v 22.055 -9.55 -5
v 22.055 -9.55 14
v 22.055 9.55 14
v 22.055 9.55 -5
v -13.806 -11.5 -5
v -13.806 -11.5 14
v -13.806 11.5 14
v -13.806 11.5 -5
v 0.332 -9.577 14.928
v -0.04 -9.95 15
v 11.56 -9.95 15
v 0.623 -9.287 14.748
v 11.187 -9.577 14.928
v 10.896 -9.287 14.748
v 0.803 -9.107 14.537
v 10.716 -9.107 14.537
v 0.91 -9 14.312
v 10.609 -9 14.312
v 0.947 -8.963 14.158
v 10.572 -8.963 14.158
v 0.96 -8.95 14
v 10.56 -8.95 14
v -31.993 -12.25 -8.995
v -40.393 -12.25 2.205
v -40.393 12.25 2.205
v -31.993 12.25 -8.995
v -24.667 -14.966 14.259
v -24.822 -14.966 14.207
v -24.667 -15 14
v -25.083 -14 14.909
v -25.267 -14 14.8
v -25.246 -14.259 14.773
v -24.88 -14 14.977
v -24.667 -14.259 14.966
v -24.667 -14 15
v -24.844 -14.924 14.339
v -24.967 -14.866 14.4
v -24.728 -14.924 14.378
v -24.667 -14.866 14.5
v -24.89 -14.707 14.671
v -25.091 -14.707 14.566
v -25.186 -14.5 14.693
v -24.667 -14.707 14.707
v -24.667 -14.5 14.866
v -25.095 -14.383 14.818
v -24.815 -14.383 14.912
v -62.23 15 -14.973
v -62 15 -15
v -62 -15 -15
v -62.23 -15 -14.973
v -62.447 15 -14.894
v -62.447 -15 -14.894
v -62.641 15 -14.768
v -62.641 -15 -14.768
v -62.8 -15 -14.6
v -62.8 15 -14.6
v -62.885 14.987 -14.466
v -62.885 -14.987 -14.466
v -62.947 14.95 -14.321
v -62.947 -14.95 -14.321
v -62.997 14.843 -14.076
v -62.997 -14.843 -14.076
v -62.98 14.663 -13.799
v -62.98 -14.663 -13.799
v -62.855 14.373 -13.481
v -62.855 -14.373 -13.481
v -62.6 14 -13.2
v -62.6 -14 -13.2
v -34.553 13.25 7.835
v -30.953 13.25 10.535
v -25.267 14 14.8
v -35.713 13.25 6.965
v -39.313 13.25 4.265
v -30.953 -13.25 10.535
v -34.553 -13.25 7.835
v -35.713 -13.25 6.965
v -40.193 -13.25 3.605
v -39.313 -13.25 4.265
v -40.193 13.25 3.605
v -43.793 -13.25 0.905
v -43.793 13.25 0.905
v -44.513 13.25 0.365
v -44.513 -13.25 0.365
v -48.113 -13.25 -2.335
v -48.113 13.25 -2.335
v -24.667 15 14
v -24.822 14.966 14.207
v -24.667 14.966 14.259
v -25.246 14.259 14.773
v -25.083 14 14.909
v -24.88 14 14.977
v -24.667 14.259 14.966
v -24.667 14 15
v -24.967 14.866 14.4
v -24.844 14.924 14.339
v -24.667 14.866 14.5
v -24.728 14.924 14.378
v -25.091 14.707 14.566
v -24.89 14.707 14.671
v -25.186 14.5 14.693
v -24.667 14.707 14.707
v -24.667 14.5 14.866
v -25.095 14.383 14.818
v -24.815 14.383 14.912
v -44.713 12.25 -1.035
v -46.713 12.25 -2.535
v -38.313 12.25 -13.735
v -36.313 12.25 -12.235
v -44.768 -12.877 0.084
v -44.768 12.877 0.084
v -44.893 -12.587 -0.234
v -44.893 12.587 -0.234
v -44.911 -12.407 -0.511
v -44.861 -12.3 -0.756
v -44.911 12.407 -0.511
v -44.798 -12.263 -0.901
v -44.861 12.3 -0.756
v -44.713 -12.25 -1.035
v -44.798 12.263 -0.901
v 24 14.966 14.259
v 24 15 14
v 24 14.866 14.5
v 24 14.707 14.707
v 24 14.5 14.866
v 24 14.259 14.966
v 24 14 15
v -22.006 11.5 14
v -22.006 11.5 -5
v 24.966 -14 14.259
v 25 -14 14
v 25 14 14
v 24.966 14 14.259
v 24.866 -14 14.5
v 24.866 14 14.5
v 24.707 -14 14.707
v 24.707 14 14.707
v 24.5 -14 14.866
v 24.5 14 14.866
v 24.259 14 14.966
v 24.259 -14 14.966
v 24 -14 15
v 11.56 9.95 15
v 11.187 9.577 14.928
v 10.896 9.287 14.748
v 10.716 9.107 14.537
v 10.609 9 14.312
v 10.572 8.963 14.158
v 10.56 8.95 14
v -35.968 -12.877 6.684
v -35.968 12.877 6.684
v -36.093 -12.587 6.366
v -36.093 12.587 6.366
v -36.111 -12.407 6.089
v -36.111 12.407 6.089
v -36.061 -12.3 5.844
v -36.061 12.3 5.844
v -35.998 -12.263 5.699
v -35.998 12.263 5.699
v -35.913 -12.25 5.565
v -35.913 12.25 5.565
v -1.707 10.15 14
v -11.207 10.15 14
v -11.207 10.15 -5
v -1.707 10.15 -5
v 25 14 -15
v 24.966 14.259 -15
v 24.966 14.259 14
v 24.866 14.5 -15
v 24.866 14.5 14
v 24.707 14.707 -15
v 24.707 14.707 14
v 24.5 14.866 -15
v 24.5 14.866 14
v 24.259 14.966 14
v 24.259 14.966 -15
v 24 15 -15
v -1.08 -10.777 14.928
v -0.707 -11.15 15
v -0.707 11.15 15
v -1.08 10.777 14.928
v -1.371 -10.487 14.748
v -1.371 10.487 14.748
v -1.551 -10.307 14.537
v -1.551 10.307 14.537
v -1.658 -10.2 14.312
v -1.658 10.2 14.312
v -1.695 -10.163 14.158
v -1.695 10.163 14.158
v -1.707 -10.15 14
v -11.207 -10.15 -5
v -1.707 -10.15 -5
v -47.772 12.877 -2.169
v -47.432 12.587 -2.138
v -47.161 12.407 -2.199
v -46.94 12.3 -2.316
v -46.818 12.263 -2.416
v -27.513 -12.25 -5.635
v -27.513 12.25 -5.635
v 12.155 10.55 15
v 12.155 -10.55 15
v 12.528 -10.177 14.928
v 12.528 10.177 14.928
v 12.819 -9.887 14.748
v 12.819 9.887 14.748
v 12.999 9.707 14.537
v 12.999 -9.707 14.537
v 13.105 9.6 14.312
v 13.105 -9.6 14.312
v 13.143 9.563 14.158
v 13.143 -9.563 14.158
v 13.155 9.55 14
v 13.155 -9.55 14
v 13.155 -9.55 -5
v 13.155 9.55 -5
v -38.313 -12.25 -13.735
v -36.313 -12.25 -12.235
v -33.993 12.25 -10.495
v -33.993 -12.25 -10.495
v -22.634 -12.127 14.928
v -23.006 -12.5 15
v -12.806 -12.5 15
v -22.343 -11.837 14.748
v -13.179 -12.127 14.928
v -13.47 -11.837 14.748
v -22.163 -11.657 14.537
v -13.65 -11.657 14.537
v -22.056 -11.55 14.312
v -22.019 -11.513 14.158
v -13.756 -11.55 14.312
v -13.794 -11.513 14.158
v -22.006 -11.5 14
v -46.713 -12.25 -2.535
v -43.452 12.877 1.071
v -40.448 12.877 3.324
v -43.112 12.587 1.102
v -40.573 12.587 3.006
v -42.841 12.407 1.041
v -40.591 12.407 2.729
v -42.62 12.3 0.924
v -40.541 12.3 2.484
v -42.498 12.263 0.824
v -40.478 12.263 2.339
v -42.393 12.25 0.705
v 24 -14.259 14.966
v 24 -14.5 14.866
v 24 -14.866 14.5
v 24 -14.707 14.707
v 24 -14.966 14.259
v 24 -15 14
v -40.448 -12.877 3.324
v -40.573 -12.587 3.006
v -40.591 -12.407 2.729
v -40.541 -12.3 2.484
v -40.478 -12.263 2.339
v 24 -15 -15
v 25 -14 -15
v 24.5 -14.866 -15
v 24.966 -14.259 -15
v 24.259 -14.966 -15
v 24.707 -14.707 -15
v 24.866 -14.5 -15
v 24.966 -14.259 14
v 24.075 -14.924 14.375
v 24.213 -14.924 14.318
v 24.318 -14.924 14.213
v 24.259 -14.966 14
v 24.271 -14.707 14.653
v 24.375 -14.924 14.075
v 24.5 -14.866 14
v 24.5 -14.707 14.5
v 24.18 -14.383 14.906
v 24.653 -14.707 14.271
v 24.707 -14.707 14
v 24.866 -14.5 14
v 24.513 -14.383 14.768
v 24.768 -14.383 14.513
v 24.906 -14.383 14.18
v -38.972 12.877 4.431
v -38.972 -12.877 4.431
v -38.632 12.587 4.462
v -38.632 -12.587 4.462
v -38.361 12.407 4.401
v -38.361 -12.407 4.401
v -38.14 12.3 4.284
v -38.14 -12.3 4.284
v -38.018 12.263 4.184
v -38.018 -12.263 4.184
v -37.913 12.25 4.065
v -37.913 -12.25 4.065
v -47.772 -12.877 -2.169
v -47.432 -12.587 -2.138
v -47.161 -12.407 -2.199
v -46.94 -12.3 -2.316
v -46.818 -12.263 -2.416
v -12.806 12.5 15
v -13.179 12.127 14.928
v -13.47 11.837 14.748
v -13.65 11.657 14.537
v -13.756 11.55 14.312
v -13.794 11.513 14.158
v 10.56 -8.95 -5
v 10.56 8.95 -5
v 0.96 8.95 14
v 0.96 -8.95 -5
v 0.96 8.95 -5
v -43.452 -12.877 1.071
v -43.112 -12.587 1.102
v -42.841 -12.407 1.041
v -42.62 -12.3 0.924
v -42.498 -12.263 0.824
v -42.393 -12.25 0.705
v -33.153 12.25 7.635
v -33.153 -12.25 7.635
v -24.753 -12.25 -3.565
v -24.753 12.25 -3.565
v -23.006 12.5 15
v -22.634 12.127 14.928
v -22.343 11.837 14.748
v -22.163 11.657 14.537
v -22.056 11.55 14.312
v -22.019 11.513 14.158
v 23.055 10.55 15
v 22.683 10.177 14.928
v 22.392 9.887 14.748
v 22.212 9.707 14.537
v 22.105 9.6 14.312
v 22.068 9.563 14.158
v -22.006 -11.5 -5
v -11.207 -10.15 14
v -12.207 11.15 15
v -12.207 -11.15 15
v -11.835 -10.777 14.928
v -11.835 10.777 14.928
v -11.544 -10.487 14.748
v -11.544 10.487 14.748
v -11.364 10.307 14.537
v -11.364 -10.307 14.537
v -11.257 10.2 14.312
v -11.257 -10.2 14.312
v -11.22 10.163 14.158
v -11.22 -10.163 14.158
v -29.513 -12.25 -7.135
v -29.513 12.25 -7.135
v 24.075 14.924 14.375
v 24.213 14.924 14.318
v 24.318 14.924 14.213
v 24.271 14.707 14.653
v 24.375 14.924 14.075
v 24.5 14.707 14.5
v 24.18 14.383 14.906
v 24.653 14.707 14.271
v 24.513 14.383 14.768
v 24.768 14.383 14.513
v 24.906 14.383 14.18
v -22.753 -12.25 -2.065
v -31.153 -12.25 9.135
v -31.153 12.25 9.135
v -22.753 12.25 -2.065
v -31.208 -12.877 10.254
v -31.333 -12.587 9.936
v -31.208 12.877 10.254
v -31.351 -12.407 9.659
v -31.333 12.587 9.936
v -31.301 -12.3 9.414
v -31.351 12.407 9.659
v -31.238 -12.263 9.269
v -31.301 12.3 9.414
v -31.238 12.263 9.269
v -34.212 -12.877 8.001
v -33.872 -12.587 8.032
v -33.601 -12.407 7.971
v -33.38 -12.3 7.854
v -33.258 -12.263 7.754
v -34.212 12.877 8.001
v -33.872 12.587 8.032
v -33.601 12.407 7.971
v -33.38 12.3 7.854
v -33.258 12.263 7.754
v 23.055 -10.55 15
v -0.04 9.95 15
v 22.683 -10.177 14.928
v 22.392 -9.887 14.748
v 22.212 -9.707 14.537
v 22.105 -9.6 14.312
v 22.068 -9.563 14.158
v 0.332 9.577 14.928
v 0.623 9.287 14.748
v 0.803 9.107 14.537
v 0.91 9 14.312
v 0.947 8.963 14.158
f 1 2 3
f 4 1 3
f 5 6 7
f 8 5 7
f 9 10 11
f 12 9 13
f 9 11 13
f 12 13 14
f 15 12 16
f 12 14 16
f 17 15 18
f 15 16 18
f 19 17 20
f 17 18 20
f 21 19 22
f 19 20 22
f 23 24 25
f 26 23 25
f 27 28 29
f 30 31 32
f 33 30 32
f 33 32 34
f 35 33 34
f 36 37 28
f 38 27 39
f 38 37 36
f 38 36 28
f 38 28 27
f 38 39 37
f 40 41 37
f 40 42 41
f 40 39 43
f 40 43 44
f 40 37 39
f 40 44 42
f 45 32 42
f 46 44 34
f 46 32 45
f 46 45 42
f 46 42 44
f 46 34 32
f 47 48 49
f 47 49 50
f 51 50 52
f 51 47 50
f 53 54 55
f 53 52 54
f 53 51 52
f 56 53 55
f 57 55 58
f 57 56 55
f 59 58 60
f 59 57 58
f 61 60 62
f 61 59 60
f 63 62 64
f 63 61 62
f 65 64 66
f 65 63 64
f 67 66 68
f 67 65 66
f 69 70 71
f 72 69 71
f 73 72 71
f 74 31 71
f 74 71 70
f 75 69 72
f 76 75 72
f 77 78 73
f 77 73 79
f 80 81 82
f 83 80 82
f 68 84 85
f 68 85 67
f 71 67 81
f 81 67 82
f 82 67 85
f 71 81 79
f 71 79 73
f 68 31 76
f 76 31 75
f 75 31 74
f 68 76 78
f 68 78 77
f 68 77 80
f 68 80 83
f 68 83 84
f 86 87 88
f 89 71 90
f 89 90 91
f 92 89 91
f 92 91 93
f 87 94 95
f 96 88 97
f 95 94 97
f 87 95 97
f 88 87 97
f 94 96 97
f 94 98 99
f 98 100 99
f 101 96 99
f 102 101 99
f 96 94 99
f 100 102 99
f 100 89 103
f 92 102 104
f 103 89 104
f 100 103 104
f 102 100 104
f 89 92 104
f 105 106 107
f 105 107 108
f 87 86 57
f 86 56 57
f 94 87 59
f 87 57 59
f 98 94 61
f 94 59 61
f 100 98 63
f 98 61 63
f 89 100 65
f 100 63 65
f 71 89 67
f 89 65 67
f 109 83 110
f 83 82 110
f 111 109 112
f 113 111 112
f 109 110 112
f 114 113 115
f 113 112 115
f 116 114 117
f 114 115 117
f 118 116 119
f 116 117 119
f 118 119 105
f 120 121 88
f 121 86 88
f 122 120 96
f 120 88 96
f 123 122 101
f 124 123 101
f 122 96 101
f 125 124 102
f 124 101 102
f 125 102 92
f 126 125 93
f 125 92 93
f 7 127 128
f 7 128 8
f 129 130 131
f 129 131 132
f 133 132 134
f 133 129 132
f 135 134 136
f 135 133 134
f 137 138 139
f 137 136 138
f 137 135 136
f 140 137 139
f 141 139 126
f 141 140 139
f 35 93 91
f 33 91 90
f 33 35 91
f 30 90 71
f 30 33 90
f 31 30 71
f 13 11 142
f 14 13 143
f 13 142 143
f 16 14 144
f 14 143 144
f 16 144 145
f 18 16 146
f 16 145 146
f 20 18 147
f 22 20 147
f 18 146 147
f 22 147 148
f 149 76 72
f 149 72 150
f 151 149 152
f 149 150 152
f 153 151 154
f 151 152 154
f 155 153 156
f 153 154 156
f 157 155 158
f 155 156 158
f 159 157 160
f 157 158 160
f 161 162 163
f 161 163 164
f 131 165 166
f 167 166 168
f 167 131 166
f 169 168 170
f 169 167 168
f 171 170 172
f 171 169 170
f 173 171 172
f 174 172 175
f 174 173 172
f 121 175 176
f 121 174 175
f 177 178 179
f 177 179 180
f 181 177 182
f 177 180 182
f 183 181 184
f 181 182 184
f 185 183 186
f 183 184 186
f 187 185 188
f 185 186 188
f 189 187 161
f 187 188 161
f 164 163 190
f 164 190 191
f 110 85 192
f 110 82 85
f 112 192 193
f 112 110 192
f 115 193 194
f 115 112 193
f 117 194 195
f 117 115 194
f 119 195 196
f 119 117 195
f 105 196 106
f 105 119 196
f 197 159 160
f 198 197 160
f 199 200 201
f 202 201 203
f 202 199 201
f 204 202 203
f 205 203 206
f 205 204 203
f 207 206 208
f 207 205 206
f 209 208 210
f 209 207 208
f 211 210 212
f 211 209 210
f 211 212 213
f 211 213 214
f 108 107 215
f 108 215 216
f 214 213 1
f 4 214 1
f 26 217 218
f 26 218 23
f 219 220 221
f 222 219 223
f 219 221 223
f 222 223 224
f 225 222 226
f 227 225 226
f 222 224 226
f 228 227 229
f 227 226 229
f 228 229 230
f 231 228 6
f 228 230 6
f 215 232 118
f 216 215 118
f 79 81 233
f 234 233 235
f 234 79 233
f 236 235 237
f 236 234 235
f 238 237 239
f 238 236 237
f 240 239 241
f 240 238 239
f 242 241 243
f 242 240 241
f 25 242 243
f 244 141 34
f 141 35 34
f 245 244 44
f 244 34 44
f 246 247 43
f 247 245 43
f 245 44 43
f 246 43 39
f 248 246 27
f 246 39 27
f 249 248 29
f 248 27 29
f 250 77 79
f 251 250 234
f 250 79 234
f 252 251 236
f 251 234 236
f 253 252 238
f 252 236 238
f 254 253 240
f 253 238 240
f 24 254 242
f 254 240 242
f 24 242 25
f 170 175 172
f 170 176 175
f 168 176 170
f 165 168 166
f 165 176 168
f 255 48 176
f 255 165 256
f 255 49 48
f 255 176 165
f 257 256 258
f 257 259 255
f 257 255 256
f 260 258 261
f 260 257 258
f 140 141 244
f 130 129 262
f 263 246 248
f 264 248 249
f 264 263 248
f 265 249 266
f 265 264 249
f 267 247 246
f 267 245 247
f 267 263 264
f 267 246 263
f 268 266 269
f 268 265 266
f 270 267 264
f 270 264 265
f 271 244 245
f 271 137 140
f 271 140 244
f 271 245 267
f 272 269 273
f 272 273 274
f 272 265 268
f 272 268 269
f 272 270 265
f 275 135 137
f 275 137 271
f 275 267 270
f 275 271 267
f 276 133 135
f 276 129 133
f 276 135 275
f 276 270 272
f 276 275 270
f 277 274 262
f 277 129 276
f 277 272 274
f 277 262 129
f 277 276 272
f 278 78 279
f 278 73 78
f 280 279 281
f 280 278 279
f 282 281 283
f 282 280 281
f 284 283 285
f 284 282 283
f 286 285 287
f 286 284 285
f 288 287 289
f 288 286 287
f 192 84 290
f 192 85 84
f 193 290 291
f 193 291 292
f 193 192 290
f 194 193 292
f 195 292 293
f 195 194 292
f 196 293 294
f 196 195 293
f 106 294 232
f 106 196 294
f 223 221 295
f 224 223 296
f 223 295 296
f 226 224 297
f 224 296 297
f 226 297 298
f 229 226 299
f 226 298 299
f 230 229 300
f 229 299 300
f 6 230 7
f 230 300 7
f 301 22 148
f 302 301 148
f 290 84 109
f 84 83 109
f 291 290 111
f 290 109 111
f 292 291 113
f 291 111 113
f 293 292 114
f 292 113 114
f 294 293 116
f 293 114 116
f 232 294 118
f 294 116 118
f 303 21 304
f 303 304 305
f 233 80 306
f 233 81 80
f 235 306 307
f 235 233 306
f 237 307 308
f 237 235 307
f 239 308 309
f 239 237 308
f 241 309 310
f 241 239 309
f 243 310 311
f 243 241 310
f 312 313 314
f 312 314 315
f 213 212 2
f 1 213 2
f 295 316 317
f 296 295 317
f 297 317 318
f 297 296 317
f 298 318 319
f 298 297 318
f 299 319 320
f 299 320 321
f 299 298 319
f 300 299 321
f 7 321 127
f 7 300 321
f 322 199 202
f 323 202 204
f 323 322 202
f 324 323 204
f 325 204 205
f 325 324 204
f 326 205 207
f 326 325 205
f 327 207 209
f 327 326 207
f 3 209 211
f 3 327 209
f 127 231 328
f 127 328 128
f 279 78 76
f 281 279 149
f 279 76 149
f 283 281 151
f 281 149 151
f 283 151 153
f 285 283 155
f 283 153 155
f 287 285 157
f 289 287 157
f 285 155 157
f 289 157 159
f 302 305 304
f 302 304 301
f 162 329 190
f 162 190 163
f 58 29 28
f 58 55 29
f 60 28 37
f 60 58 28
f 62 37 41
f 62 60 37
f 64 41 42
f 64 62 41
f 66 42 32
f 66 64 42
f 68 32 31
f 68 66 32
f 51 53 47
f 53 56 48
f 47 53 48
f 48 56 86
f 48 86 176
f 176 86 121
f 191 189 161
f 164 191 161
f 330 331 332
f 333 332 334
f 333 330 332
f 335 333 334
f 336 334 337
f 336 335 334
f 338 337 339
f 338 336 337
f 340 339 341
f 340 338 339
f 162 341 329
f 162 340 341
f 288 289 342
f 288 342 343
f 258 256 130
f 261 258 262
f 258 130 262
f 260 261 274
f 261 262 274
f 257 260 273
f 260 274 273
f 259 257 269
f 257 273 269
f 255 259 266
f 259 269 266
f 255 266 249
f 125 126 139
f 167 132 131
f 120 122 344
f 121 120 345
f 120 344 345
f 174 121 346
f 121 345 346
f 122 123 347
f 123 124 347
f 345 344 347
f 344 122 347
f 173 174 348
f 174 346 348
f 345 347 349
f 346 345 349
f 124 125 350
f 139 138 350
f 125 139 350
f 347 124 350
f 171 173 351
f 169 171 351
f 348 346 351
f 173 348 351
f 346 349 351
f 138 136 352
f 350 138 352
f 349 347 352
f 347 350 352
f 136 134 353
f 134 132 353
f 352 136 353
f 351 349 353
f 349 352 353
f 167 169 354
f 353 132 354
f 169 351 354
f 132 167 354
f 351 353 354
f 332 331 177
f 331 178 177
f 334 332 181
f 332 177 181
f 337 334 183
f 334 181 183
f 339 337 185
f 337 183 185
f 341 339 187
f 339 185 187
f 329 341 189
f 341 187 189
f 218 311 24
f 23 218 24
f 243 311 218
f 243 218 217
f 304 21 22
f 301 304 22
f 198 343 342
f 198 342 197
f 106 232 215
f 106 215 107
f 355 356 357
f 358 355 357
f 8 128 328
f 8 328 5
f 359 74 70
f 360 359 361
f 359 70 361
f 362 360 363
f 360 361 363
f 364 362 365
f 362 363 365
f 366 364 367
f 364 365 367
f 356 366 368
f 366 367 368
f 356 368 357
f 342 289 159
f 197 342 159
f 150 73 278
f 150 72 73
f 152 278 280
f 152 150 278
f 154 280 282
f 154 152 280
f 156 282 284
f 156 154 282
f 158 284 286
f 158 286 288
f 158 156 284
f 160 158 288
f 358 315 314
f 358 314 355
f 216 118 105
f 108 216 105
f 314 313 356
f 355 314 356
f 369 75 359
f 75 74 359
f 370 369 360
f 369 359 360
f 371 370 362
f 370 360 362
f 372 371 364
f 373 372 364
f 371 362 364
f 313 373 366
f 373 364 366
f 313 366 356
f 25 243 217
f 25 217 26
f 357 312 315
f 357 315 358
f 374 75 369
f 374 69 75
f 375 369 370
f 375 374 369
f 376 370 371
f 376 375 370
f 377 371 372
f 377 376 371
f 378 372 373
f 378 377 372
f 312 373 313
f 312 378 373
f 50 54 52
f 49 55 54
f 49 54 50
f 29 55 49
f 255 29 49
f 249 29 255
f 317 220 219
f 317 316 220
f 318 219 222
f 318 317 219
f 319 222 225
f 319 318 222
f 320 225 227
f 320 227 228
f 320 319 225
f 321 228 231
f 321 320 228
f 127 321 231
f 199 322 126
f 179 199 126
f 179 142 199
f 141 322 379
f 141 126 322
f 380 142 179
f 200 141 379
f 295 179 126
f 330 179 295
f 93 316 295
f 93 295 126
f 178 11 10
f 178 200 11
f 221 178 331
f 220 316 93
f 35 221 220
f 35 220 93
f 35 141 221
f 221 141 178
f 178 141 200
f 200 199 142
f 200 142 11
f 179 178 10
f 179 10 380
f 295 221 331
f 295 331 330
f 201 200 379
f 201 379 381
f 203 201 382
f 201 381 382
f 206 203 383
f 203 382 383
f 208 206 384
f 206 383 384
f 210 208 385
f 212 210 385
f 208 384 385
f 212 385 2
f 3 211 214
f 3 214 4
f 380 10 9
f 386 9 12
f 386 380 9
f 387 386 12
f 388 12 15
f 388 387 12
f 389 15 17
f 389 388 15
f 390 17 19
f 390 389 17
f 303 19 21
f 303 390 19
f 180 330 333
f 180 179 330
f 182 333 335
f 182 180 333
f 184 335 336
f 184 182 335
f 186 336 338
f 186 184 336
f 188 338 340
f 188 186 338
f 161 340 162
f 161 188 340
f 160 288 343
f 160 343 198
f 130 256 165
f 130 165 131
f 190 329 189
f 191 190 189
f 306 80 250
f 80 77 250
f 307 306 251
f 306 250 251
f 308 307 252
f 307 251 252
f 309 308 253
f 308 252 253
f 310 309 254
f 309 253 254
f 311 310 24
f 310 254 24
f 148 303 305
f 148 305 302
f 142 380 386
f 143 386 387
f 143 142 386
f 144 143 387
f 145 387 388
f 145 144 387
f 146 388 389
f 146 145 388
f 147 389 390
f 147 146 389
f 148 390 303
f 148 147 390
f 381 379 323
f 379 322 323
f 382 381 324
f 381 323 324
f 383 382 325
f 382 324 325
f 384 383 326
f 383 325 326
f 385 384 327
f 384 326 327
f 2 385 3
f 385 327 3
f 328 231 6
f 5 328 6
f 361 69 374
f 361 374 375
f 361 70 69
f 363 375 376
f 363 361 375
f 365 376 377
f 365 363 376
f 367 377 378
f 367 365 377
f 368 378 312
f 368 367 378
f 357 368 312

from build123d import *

# Parameters (mm, degrees)
F1_DEPTH = 15
F3_W     = 8.2
F3_H     = 23
F3_W_2   = 9.5
F3_H_2   = 20.3
F3_W_3   = 9.6
F3_H_3   = 17.9
F3_W_4   = 8.9
F3_H_4   = 19.1
F4_DEPTH = 25
F5_W     = 2.5
F5_H     = 24.5
F6_DEPTH = 15
F7_DEPTH = 15
F8_R     = 1


# Not quite as in the source:
# - a feature names something its author has since deleted; it is built from what else it names


with BuildPart() as f1:
    # F0 (on Front) → F1 (new body, symmetric)
    with BuildSketch(Plane.XZ):
        Polygon((25, -15), (25, 15), (-25, 15), (-65, -15), (-25, -15), align=None)
    extrude(amount=F1_DEPTH, both=True)

    # F3 (on offset) → F4 (cut)
    with BuildSketch(Plane.XY.offset(20)):
        with Locations((-17.9062577261, 0)):
            Rectangle(F3_W, F3_H)
        with Locations((-6.4574469417, 0)):
            Rectangle(F3_W_2, F3_H_2)
        with Locations((5.7595338684, 0)):
            Rectangle(F3_W_3, F3_H_3)
        with Locations((17.6052688631, 0)):
            Rectangle(F3_W_4, F3_H_4)
    extrude(amount=-F4_DEPTH, mode=Mode.SUBTRACT)

    # F5 (on face) → F6 (cut)
    with BuildSketch(Plane(origin=(-16.2, 0, 21.6), x_dir=(0.8, 0, 0.6), z_dir=(-0.6, 0, 0.8))):
        with Locations((-20.6918526966, 0)):
            Rectangle(F5_W, F5_H)
    extrude(amount=-F6_DEPTH, mode=Mode.SUBTRACT)

    # F5 (on face) → F7 (cut)
    with BuildSketch(Plane(origin=(-16.2, 0, 21.6), x_dir=(0.8, 0, 0.6), z_dir=(-0.6, 0, 0.8))):
        with Locations((-26.6418426484, -3.204e-07)):
            Rectangle(F5_W, F5_H)
        with Locations((-32.2418349981, 3.204e-07)):
            Rectangle(F5_W, F5_H)
        with Locations((-37.6418220997, 0)):
            Rectangle(F5_W, F5_H)
    extrude(amount=-F7_DEPTH, mode=Mode.SUBTRACT)

    # F8
    f8_edges = [f1.edges().sort_by_distance(p)[0] for p in [
        (-25, 0, 15),
        (-45, 15, 0),
        (-45, -15, 0),
        (-65, 0, -15),
        (-33.753482, 0, 8.434888),
        (-32.753482, 12.25, 9.184888),
        (-32.753482, -12.25, 9.184888),
        (-31.753482, 0, 9.934888),
        (-41.993468, -12.25, 2.254899),
        (-40.993468, 0, 3.004899),
        (-41.993468, 12.25, 2.254899),
        (-42.993468, 0, 1.504899),
        (-45.313458, 0, -0.235093),
        (-46.313458, 12.25, -0.985093),
        (-47.313458, 0, -1.735093),
        (-46.313458, -12.25, -0.985093),
        (-36.513474, 0, 6.364894),
        (-37.513474, 12.25, 5.614894),
        (-38.513474, 0, 4.864894),
        (-37.513474, -12.25, 5.614894),
        (25, 0, 15),
        (0, 15, 15),
        (0, -15, 15),
        (22.055269, 0, 15),
        (17.605269, 9.55, 15),
        (13.155269, 0, 15),
        (17.605269, -9.55, 15),
        (10.559534, 0, 15),
        (5.759534, 8.95, 15),
        (0.959534, 0, 15),
        (5.759534, -8.95, 15),
        (-11.207447, 0, 15),
        (-6.457447, -10.15, 15),
        (-1.707447, 0, 15),
        (-6.457447, 10.15, 15),
        (-17.906258, -11.5, 15),
        (-13.806258, 0, 15),
        (-17.906258, 11.5, 15),
        (-22.006258, 0, 15),
        (25, -15, 0),
        (25, 15, 0),
    ]]
    fillet(f8_edges, radius=F8_R)


solid = f1.part
